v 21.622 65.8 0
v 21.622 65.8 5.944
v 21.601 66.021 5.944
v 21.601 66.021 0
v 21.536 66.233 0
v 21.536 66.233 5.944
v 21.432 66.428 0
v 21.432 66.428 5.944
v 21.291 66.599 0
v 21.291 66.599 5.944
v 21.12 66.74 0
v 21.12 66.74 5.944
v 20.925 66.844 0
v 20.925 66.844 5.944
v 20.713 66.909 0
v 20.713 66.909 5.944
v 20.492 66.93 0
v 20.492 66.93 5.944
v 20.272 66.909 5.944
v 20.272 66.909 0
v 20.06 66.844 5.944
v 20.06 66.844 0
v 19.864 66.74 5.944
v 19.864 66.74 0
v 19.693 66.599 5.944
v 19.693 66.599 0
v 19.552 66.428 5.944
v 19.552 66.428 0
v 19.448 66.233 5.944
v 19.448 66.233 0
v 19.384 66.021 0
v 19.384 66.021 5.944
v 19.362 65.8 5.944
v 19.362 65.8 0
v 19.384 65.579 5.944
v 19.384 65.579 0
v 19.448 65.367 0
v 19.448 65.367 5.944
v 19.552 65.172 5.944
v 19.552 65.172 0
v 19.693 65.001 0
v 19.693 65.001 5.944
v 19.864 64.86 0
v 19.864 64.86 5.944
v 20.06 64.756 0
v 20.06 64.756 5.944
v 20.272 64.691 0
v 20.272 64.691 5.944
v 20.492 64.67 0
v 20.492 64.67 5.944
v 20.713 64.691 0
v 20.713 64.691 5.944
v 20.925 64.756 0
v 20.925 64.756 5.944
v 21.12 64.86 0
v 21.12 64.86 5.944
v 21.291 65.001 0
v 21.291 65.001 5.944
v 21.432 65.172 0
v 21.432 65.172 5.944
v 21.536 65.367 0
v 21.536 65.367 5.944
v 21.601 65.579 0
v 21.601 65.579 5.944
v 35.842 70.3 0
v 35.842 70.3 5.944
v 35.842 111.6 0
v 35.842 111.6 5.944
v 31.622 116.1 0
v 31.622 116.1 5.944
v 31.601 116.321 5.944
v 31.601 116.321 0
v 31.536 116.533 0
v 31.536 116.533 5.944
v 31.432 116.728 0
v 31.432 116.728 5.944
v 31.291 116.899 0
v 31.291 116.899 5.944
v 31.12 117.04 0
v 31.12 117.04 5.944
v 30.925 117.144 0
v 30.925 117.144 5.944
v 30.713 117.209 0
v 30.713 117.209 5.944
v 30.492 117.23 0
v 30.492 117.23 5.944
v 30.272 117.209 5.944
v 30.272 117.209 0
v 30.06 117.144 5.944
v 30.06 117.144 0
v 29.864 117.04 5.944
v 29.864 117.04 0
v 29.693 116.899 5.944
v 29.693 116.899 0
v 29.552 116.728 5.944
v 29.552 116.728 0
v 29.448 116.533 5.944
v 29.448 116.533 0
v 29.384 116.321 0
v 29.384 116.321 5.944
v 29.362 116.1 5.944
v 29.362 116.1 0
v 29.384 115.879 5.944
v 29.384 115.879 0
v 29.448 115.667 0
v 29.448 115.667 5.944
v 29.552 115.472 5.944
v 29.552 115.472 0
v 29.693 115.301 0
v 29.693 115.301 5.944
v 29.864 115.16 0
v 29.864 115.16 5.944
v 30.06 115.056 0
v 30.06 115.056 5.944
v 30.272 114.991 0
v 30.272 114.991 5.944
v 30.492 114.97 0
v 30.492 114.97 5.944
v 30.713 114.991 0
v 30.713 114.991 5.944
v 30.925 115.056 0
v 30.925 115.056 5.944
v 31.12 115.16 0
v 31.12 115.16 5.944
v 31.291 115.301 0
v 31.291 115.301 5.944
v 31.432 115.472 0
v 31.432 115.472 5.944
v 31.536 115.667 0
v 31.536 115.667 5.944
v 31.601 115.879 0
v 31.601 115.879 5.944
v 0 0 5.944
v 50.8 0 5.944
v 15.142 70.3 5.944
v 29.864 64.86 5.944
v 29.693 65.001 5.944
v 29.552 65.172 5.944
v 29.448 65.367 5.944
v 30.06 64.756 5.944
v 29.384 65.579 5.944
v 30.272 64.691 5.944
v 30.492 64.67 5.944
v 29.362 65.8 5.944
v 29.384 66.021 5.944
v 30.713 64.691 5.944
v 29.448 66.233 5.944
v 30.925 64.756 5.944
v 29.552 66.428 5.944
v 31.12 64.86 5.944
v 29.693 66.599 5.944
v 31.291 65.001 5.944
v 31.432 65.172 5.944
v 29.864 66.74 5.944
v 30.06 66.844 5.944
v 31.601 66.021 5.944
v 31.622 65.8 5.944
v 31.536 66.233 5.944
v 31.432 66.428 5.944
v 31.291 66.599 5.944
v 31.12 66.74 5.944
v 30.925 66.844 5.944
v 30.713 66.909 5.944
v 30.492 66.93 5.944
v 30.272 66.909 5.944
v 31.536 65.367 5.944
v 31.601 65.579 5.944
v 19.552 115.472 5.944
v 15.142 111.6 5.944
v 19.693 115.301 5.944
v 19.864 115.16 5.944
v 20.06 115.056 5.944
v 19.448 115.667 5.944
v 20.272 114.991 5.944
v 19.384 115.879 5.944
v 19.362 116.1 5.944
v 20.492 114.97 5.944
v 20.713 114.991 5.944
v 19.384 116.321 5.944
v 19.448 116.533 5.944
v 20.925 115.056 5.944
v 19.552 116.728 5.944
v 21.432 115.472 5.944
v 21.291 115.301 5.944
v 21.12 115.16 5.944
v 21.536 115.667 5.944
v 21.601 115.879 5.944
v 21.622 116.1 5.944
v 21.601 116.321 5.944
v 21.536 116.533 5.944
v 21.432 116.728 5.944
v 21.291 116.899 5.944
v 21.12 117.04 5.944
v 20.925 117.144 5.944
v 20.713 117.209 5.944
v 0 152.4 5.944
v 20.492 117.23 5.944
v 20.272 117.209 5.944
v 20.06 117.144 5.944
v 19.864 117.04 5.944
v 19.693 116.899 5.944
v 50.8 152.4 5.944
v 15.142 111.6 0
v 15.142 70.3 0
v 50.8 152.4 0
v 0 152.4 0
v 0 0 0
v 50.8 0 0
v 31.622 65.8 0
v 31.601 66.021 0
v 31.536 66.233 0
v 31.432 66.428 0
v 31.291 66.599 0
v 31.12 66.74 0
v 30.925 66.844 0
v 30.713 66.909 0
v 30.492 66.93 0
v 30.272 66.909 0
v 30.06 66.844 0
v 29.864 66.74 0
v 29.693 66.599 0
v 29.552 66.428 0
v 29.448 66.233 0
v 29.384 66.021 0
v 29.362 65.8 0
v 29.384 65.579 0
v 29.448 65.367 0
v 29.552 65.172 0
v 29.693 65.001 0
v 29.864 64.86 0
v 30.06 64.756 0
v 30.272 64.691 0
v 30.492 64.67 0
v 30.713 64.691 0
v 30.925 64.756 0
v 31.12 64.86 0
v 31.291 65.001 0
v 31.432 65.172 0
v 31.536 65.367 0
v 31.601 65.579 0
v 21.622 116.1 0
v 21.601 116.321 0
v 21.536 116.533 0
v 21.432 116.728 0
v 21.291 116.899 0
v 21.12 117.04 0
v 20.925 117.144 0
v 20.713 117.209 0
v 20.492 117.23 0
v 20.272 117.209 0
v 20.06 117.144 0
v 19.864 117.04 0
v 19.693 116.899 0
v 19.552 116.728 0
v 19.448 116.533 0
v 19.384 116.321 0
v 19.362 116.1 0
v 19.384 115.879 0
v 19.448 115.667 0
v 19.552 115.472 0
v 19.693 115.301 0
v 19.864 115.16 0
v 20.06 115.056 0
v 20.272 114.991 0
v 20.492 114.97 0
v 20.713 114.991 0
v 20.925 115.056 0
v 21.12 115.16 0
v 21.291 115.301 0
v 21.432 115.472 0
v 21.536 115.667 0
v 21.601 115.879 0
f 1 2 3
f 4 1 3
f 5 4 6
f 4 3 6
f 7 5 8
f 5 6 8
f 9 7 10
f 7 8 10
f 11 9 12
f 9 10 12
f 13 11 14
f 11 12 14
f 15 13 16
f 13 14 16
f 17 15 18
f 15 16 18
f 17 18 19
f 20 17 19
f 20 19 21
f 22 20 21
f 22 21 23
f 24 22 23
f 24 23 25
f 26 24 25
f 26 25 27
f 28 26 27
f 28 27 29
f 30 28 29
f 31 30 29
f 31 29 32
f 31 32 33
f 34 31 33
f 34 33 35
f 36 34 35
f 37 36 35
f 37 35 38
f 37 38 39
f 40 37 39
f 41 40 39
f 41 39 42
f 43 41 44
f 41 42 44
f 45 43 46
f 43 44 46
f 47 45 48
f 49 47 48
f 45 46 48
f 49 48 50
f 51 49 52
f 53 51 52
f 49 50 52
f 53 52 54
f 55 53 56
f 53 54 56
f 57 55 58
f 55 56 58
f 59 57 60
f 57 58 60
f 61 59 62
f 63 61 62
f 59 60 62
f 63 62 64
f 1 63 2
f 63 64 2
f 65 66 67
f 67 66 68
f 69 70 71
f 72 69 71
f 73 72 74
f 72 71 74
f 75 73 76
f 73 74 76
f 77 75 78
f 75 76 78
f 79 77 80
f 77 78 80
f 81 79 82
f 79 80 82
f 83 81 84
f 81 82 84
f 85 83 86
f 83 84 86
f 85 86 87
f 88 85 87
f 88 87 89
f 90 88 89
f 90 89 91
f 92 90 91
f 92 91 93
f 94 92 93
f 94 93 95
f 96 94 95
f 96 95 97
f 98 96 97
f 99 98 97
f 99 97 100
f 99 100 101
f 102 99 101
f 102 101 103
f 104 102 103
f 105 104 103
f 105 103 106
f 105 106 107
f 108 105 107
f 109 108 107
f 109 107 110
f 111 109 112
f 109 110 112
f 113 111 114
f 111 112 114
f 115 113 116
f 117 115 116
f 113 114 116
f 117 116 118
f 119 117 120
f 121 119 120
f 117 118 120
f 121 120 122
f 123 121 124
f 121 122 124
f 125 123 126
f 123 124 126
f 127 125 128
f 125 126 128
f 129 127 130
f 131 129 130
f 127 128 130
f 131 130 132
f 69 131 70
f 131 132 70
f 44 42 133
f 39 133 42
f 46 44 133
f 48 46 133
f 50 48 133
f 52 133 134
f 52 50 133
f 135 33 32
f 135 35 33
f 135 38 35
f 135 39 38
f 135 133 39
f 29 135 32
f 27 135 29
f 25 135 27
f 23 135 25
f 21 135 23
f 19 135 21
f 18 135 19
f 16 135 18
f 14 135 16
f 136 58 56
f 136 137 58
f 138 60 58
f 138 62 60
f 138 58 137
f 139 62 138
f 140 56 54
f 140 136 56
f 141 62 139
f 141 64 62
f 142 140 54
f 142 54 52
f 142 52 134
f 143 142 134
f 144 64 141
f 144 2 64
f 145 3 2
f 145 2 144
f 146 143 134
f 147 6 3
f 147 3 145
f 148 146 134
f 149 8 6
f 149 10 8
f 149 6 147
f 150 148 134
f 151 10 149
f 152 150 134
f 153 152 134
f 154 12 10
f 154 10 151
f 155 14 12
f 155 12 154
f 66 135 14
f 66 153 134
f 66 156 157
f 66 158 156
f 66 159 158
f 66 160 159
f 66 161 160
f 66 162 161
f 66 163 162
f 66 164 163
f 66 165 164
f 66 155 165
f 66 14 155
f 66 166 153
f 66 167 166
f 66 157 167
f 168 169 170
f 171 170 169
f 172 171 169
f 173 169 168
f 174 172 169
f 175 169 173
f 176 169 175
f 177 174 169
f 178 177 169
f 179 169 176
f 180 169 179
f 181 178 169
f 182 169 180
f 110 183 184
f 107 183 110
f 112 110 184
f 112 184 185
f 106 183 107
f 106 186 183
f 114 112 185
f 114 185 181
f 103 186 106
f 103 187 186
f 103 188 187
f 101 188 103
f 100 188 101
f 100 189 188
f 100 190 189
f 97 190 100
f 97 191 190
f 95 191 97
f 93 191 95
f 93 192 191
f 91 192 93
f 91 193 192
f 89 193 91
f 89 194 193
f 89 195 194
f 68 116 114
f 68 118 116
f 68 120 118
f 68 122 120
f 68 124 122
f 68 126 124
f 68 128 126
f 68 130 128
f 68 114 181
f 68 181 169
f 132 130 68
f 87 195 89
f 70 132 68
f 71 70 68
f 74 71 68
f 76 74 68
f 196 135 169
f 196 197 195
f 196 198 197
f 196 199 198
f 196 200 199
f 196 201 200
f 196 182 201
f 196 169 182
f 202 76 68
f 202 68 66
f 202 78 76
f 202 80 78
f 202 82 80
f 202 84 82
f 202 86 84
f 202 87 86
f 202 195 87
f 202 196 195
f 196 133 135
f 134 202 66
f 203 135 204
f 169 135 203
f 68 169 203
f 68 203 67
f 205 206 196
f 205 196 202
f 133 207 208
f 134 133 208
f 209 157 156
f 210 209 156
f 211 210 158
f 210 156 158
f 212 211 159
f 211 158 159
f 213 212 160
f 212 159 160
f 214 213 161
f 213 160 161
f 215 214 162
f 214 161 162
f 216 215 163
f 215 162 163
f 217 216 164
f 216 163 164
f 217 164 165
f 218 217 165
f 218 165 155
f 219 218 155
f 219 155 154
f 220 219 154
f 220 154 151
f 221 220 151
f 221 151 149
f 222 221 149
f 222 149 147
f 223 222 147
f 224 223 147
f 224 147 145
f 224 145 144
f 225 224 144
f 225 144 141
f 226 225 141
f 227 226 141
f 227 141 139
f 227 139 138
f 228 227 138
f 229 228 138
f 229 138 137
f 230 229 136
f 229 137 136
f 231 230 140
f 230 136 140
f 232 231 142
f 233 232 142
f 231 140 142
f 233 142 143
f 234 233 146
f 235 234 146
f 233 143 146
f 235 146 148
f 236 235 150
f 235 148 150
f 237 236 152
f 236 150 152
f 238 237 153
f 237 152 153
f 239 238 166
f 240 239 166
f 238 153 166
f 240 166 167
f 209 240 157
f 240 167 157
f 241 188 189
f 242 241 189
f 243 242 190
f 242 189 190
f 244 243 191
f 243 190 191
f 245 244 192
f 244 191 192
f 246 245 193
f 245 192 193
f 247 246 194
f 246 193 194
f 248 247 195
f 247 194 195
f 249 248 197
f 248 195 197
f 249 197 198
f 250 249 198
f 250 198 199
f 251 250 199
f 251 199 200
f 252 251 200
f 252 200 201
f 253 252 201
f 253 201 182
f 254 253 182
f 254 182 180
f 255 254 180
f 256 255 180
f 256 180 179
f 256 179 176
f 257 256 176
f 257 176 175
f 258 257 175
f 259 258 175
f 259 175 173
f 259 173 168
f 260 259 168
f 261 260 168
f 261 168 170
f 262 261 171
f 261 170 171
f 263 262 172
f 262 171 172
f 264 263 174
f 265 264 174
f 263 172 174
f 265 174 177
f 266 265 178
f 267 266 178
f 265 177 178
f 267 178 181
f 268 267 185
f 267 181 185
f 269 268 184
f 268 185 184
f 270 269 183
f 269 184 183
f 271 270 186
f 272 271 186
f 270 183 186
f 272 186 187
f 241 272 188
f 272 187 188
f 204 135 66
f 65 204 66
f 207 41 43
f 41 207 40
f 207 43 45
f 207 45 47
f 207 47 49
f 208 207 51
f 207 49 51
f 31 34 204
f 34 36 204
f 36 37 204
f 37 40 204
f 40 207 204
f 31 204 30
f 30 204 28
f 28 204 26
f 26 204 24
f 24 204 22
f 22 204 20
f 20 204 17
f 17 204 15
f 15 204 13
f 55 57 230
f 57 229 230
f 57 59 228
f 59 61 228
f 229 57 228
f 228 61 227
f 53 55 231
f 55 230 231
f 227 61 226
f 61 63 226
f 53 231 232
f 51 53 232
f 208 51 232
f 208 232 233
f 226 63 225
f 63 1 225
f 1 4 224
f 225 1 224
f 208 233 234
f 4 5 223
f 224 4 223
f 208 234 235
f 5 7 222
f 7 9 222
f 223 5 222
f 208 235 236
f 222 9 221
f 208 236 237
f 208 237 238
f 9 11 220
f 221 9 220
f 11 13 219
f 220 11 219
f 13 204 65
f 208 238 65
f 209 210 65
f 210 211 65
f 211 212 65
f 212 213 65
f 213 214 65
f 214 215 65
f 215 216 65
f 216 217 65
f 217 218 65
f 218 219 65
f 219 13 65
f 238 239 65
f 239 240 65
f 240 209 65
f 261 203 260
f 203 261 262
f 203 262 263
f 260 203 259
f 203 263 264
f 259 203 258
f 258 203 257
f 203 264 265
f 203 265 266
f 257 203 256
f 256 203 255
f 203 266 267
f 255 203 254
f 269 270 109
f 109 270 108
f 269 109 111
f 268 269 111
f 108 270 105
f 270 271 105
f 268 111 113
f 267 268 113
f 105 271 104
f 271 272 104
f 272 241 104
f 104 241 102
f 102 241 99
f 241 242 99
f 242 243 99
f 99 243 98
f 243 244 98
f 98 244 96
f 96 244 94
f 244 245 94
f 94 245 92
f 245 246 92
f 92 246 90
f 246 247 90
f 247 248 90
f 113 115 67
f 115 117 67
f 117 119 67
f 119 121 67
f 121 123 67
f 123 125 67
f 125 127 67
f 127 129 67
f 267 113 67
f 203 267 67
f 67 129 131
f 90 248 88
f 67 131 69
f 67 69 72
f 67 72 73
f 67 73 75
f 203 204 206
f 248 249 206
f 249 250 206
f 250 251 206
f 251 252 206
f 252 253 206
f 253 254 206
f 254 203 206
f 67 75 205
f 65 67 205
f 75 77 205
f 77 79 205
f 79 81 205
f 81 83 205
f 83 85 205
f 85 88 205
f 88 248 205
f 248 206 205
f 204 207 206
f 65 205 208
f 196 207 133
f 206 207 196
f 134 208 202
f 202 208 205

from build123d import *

# Parameters (mm, degrees)
SKETCH1_W           = 50.8
SKETCH1_H           = 152.4
BOSS_EXTRUDE1_DEPTH = 5.9436
SKETCH2_R           = 1.1303
SKETCH2_W           = 20.7
SKETCH2_H           = 41.3
CUT_EXTRUDE1_DEPTH  = 6.9436


with BuildPart() as part:
    # Sketch1 → Boss-Extrude1 (new body)
    with BuildSketch(Plane.XY):
        with Locations((25.4, 76.2)):
            Rectangle(SKETCH1_W, SKETCH1_H)
    extrude(amount=BOSS_EXTRUDE1_DEPTH)

    # Sketch2 → Cut-Extrude1 (cut, through all)
    with BuildSketch(Plane.XY.offset(5.9436)):
        with Locations((20.492131346, 116.1)):
            Circle(SKETCH2_R)
        with Locations((30.492131346, 116.1)):
            Circle(SKETCH2_R)
        with Locations((20.492131346, 65.8)):
            Circle(SKETCH2_R)
        with Locations((30.492131346, 65.8)):
            Circle(SKETCH2_R)
        with Locations((25.492131346, 90.95)):
            Rectangle(SKETCH2_W, SKETCH2_H)
    extrude(amount=-CUT_EXTRUDE1_DEPTH, mode=Mode.SUBTRACT)


solid = part.part
